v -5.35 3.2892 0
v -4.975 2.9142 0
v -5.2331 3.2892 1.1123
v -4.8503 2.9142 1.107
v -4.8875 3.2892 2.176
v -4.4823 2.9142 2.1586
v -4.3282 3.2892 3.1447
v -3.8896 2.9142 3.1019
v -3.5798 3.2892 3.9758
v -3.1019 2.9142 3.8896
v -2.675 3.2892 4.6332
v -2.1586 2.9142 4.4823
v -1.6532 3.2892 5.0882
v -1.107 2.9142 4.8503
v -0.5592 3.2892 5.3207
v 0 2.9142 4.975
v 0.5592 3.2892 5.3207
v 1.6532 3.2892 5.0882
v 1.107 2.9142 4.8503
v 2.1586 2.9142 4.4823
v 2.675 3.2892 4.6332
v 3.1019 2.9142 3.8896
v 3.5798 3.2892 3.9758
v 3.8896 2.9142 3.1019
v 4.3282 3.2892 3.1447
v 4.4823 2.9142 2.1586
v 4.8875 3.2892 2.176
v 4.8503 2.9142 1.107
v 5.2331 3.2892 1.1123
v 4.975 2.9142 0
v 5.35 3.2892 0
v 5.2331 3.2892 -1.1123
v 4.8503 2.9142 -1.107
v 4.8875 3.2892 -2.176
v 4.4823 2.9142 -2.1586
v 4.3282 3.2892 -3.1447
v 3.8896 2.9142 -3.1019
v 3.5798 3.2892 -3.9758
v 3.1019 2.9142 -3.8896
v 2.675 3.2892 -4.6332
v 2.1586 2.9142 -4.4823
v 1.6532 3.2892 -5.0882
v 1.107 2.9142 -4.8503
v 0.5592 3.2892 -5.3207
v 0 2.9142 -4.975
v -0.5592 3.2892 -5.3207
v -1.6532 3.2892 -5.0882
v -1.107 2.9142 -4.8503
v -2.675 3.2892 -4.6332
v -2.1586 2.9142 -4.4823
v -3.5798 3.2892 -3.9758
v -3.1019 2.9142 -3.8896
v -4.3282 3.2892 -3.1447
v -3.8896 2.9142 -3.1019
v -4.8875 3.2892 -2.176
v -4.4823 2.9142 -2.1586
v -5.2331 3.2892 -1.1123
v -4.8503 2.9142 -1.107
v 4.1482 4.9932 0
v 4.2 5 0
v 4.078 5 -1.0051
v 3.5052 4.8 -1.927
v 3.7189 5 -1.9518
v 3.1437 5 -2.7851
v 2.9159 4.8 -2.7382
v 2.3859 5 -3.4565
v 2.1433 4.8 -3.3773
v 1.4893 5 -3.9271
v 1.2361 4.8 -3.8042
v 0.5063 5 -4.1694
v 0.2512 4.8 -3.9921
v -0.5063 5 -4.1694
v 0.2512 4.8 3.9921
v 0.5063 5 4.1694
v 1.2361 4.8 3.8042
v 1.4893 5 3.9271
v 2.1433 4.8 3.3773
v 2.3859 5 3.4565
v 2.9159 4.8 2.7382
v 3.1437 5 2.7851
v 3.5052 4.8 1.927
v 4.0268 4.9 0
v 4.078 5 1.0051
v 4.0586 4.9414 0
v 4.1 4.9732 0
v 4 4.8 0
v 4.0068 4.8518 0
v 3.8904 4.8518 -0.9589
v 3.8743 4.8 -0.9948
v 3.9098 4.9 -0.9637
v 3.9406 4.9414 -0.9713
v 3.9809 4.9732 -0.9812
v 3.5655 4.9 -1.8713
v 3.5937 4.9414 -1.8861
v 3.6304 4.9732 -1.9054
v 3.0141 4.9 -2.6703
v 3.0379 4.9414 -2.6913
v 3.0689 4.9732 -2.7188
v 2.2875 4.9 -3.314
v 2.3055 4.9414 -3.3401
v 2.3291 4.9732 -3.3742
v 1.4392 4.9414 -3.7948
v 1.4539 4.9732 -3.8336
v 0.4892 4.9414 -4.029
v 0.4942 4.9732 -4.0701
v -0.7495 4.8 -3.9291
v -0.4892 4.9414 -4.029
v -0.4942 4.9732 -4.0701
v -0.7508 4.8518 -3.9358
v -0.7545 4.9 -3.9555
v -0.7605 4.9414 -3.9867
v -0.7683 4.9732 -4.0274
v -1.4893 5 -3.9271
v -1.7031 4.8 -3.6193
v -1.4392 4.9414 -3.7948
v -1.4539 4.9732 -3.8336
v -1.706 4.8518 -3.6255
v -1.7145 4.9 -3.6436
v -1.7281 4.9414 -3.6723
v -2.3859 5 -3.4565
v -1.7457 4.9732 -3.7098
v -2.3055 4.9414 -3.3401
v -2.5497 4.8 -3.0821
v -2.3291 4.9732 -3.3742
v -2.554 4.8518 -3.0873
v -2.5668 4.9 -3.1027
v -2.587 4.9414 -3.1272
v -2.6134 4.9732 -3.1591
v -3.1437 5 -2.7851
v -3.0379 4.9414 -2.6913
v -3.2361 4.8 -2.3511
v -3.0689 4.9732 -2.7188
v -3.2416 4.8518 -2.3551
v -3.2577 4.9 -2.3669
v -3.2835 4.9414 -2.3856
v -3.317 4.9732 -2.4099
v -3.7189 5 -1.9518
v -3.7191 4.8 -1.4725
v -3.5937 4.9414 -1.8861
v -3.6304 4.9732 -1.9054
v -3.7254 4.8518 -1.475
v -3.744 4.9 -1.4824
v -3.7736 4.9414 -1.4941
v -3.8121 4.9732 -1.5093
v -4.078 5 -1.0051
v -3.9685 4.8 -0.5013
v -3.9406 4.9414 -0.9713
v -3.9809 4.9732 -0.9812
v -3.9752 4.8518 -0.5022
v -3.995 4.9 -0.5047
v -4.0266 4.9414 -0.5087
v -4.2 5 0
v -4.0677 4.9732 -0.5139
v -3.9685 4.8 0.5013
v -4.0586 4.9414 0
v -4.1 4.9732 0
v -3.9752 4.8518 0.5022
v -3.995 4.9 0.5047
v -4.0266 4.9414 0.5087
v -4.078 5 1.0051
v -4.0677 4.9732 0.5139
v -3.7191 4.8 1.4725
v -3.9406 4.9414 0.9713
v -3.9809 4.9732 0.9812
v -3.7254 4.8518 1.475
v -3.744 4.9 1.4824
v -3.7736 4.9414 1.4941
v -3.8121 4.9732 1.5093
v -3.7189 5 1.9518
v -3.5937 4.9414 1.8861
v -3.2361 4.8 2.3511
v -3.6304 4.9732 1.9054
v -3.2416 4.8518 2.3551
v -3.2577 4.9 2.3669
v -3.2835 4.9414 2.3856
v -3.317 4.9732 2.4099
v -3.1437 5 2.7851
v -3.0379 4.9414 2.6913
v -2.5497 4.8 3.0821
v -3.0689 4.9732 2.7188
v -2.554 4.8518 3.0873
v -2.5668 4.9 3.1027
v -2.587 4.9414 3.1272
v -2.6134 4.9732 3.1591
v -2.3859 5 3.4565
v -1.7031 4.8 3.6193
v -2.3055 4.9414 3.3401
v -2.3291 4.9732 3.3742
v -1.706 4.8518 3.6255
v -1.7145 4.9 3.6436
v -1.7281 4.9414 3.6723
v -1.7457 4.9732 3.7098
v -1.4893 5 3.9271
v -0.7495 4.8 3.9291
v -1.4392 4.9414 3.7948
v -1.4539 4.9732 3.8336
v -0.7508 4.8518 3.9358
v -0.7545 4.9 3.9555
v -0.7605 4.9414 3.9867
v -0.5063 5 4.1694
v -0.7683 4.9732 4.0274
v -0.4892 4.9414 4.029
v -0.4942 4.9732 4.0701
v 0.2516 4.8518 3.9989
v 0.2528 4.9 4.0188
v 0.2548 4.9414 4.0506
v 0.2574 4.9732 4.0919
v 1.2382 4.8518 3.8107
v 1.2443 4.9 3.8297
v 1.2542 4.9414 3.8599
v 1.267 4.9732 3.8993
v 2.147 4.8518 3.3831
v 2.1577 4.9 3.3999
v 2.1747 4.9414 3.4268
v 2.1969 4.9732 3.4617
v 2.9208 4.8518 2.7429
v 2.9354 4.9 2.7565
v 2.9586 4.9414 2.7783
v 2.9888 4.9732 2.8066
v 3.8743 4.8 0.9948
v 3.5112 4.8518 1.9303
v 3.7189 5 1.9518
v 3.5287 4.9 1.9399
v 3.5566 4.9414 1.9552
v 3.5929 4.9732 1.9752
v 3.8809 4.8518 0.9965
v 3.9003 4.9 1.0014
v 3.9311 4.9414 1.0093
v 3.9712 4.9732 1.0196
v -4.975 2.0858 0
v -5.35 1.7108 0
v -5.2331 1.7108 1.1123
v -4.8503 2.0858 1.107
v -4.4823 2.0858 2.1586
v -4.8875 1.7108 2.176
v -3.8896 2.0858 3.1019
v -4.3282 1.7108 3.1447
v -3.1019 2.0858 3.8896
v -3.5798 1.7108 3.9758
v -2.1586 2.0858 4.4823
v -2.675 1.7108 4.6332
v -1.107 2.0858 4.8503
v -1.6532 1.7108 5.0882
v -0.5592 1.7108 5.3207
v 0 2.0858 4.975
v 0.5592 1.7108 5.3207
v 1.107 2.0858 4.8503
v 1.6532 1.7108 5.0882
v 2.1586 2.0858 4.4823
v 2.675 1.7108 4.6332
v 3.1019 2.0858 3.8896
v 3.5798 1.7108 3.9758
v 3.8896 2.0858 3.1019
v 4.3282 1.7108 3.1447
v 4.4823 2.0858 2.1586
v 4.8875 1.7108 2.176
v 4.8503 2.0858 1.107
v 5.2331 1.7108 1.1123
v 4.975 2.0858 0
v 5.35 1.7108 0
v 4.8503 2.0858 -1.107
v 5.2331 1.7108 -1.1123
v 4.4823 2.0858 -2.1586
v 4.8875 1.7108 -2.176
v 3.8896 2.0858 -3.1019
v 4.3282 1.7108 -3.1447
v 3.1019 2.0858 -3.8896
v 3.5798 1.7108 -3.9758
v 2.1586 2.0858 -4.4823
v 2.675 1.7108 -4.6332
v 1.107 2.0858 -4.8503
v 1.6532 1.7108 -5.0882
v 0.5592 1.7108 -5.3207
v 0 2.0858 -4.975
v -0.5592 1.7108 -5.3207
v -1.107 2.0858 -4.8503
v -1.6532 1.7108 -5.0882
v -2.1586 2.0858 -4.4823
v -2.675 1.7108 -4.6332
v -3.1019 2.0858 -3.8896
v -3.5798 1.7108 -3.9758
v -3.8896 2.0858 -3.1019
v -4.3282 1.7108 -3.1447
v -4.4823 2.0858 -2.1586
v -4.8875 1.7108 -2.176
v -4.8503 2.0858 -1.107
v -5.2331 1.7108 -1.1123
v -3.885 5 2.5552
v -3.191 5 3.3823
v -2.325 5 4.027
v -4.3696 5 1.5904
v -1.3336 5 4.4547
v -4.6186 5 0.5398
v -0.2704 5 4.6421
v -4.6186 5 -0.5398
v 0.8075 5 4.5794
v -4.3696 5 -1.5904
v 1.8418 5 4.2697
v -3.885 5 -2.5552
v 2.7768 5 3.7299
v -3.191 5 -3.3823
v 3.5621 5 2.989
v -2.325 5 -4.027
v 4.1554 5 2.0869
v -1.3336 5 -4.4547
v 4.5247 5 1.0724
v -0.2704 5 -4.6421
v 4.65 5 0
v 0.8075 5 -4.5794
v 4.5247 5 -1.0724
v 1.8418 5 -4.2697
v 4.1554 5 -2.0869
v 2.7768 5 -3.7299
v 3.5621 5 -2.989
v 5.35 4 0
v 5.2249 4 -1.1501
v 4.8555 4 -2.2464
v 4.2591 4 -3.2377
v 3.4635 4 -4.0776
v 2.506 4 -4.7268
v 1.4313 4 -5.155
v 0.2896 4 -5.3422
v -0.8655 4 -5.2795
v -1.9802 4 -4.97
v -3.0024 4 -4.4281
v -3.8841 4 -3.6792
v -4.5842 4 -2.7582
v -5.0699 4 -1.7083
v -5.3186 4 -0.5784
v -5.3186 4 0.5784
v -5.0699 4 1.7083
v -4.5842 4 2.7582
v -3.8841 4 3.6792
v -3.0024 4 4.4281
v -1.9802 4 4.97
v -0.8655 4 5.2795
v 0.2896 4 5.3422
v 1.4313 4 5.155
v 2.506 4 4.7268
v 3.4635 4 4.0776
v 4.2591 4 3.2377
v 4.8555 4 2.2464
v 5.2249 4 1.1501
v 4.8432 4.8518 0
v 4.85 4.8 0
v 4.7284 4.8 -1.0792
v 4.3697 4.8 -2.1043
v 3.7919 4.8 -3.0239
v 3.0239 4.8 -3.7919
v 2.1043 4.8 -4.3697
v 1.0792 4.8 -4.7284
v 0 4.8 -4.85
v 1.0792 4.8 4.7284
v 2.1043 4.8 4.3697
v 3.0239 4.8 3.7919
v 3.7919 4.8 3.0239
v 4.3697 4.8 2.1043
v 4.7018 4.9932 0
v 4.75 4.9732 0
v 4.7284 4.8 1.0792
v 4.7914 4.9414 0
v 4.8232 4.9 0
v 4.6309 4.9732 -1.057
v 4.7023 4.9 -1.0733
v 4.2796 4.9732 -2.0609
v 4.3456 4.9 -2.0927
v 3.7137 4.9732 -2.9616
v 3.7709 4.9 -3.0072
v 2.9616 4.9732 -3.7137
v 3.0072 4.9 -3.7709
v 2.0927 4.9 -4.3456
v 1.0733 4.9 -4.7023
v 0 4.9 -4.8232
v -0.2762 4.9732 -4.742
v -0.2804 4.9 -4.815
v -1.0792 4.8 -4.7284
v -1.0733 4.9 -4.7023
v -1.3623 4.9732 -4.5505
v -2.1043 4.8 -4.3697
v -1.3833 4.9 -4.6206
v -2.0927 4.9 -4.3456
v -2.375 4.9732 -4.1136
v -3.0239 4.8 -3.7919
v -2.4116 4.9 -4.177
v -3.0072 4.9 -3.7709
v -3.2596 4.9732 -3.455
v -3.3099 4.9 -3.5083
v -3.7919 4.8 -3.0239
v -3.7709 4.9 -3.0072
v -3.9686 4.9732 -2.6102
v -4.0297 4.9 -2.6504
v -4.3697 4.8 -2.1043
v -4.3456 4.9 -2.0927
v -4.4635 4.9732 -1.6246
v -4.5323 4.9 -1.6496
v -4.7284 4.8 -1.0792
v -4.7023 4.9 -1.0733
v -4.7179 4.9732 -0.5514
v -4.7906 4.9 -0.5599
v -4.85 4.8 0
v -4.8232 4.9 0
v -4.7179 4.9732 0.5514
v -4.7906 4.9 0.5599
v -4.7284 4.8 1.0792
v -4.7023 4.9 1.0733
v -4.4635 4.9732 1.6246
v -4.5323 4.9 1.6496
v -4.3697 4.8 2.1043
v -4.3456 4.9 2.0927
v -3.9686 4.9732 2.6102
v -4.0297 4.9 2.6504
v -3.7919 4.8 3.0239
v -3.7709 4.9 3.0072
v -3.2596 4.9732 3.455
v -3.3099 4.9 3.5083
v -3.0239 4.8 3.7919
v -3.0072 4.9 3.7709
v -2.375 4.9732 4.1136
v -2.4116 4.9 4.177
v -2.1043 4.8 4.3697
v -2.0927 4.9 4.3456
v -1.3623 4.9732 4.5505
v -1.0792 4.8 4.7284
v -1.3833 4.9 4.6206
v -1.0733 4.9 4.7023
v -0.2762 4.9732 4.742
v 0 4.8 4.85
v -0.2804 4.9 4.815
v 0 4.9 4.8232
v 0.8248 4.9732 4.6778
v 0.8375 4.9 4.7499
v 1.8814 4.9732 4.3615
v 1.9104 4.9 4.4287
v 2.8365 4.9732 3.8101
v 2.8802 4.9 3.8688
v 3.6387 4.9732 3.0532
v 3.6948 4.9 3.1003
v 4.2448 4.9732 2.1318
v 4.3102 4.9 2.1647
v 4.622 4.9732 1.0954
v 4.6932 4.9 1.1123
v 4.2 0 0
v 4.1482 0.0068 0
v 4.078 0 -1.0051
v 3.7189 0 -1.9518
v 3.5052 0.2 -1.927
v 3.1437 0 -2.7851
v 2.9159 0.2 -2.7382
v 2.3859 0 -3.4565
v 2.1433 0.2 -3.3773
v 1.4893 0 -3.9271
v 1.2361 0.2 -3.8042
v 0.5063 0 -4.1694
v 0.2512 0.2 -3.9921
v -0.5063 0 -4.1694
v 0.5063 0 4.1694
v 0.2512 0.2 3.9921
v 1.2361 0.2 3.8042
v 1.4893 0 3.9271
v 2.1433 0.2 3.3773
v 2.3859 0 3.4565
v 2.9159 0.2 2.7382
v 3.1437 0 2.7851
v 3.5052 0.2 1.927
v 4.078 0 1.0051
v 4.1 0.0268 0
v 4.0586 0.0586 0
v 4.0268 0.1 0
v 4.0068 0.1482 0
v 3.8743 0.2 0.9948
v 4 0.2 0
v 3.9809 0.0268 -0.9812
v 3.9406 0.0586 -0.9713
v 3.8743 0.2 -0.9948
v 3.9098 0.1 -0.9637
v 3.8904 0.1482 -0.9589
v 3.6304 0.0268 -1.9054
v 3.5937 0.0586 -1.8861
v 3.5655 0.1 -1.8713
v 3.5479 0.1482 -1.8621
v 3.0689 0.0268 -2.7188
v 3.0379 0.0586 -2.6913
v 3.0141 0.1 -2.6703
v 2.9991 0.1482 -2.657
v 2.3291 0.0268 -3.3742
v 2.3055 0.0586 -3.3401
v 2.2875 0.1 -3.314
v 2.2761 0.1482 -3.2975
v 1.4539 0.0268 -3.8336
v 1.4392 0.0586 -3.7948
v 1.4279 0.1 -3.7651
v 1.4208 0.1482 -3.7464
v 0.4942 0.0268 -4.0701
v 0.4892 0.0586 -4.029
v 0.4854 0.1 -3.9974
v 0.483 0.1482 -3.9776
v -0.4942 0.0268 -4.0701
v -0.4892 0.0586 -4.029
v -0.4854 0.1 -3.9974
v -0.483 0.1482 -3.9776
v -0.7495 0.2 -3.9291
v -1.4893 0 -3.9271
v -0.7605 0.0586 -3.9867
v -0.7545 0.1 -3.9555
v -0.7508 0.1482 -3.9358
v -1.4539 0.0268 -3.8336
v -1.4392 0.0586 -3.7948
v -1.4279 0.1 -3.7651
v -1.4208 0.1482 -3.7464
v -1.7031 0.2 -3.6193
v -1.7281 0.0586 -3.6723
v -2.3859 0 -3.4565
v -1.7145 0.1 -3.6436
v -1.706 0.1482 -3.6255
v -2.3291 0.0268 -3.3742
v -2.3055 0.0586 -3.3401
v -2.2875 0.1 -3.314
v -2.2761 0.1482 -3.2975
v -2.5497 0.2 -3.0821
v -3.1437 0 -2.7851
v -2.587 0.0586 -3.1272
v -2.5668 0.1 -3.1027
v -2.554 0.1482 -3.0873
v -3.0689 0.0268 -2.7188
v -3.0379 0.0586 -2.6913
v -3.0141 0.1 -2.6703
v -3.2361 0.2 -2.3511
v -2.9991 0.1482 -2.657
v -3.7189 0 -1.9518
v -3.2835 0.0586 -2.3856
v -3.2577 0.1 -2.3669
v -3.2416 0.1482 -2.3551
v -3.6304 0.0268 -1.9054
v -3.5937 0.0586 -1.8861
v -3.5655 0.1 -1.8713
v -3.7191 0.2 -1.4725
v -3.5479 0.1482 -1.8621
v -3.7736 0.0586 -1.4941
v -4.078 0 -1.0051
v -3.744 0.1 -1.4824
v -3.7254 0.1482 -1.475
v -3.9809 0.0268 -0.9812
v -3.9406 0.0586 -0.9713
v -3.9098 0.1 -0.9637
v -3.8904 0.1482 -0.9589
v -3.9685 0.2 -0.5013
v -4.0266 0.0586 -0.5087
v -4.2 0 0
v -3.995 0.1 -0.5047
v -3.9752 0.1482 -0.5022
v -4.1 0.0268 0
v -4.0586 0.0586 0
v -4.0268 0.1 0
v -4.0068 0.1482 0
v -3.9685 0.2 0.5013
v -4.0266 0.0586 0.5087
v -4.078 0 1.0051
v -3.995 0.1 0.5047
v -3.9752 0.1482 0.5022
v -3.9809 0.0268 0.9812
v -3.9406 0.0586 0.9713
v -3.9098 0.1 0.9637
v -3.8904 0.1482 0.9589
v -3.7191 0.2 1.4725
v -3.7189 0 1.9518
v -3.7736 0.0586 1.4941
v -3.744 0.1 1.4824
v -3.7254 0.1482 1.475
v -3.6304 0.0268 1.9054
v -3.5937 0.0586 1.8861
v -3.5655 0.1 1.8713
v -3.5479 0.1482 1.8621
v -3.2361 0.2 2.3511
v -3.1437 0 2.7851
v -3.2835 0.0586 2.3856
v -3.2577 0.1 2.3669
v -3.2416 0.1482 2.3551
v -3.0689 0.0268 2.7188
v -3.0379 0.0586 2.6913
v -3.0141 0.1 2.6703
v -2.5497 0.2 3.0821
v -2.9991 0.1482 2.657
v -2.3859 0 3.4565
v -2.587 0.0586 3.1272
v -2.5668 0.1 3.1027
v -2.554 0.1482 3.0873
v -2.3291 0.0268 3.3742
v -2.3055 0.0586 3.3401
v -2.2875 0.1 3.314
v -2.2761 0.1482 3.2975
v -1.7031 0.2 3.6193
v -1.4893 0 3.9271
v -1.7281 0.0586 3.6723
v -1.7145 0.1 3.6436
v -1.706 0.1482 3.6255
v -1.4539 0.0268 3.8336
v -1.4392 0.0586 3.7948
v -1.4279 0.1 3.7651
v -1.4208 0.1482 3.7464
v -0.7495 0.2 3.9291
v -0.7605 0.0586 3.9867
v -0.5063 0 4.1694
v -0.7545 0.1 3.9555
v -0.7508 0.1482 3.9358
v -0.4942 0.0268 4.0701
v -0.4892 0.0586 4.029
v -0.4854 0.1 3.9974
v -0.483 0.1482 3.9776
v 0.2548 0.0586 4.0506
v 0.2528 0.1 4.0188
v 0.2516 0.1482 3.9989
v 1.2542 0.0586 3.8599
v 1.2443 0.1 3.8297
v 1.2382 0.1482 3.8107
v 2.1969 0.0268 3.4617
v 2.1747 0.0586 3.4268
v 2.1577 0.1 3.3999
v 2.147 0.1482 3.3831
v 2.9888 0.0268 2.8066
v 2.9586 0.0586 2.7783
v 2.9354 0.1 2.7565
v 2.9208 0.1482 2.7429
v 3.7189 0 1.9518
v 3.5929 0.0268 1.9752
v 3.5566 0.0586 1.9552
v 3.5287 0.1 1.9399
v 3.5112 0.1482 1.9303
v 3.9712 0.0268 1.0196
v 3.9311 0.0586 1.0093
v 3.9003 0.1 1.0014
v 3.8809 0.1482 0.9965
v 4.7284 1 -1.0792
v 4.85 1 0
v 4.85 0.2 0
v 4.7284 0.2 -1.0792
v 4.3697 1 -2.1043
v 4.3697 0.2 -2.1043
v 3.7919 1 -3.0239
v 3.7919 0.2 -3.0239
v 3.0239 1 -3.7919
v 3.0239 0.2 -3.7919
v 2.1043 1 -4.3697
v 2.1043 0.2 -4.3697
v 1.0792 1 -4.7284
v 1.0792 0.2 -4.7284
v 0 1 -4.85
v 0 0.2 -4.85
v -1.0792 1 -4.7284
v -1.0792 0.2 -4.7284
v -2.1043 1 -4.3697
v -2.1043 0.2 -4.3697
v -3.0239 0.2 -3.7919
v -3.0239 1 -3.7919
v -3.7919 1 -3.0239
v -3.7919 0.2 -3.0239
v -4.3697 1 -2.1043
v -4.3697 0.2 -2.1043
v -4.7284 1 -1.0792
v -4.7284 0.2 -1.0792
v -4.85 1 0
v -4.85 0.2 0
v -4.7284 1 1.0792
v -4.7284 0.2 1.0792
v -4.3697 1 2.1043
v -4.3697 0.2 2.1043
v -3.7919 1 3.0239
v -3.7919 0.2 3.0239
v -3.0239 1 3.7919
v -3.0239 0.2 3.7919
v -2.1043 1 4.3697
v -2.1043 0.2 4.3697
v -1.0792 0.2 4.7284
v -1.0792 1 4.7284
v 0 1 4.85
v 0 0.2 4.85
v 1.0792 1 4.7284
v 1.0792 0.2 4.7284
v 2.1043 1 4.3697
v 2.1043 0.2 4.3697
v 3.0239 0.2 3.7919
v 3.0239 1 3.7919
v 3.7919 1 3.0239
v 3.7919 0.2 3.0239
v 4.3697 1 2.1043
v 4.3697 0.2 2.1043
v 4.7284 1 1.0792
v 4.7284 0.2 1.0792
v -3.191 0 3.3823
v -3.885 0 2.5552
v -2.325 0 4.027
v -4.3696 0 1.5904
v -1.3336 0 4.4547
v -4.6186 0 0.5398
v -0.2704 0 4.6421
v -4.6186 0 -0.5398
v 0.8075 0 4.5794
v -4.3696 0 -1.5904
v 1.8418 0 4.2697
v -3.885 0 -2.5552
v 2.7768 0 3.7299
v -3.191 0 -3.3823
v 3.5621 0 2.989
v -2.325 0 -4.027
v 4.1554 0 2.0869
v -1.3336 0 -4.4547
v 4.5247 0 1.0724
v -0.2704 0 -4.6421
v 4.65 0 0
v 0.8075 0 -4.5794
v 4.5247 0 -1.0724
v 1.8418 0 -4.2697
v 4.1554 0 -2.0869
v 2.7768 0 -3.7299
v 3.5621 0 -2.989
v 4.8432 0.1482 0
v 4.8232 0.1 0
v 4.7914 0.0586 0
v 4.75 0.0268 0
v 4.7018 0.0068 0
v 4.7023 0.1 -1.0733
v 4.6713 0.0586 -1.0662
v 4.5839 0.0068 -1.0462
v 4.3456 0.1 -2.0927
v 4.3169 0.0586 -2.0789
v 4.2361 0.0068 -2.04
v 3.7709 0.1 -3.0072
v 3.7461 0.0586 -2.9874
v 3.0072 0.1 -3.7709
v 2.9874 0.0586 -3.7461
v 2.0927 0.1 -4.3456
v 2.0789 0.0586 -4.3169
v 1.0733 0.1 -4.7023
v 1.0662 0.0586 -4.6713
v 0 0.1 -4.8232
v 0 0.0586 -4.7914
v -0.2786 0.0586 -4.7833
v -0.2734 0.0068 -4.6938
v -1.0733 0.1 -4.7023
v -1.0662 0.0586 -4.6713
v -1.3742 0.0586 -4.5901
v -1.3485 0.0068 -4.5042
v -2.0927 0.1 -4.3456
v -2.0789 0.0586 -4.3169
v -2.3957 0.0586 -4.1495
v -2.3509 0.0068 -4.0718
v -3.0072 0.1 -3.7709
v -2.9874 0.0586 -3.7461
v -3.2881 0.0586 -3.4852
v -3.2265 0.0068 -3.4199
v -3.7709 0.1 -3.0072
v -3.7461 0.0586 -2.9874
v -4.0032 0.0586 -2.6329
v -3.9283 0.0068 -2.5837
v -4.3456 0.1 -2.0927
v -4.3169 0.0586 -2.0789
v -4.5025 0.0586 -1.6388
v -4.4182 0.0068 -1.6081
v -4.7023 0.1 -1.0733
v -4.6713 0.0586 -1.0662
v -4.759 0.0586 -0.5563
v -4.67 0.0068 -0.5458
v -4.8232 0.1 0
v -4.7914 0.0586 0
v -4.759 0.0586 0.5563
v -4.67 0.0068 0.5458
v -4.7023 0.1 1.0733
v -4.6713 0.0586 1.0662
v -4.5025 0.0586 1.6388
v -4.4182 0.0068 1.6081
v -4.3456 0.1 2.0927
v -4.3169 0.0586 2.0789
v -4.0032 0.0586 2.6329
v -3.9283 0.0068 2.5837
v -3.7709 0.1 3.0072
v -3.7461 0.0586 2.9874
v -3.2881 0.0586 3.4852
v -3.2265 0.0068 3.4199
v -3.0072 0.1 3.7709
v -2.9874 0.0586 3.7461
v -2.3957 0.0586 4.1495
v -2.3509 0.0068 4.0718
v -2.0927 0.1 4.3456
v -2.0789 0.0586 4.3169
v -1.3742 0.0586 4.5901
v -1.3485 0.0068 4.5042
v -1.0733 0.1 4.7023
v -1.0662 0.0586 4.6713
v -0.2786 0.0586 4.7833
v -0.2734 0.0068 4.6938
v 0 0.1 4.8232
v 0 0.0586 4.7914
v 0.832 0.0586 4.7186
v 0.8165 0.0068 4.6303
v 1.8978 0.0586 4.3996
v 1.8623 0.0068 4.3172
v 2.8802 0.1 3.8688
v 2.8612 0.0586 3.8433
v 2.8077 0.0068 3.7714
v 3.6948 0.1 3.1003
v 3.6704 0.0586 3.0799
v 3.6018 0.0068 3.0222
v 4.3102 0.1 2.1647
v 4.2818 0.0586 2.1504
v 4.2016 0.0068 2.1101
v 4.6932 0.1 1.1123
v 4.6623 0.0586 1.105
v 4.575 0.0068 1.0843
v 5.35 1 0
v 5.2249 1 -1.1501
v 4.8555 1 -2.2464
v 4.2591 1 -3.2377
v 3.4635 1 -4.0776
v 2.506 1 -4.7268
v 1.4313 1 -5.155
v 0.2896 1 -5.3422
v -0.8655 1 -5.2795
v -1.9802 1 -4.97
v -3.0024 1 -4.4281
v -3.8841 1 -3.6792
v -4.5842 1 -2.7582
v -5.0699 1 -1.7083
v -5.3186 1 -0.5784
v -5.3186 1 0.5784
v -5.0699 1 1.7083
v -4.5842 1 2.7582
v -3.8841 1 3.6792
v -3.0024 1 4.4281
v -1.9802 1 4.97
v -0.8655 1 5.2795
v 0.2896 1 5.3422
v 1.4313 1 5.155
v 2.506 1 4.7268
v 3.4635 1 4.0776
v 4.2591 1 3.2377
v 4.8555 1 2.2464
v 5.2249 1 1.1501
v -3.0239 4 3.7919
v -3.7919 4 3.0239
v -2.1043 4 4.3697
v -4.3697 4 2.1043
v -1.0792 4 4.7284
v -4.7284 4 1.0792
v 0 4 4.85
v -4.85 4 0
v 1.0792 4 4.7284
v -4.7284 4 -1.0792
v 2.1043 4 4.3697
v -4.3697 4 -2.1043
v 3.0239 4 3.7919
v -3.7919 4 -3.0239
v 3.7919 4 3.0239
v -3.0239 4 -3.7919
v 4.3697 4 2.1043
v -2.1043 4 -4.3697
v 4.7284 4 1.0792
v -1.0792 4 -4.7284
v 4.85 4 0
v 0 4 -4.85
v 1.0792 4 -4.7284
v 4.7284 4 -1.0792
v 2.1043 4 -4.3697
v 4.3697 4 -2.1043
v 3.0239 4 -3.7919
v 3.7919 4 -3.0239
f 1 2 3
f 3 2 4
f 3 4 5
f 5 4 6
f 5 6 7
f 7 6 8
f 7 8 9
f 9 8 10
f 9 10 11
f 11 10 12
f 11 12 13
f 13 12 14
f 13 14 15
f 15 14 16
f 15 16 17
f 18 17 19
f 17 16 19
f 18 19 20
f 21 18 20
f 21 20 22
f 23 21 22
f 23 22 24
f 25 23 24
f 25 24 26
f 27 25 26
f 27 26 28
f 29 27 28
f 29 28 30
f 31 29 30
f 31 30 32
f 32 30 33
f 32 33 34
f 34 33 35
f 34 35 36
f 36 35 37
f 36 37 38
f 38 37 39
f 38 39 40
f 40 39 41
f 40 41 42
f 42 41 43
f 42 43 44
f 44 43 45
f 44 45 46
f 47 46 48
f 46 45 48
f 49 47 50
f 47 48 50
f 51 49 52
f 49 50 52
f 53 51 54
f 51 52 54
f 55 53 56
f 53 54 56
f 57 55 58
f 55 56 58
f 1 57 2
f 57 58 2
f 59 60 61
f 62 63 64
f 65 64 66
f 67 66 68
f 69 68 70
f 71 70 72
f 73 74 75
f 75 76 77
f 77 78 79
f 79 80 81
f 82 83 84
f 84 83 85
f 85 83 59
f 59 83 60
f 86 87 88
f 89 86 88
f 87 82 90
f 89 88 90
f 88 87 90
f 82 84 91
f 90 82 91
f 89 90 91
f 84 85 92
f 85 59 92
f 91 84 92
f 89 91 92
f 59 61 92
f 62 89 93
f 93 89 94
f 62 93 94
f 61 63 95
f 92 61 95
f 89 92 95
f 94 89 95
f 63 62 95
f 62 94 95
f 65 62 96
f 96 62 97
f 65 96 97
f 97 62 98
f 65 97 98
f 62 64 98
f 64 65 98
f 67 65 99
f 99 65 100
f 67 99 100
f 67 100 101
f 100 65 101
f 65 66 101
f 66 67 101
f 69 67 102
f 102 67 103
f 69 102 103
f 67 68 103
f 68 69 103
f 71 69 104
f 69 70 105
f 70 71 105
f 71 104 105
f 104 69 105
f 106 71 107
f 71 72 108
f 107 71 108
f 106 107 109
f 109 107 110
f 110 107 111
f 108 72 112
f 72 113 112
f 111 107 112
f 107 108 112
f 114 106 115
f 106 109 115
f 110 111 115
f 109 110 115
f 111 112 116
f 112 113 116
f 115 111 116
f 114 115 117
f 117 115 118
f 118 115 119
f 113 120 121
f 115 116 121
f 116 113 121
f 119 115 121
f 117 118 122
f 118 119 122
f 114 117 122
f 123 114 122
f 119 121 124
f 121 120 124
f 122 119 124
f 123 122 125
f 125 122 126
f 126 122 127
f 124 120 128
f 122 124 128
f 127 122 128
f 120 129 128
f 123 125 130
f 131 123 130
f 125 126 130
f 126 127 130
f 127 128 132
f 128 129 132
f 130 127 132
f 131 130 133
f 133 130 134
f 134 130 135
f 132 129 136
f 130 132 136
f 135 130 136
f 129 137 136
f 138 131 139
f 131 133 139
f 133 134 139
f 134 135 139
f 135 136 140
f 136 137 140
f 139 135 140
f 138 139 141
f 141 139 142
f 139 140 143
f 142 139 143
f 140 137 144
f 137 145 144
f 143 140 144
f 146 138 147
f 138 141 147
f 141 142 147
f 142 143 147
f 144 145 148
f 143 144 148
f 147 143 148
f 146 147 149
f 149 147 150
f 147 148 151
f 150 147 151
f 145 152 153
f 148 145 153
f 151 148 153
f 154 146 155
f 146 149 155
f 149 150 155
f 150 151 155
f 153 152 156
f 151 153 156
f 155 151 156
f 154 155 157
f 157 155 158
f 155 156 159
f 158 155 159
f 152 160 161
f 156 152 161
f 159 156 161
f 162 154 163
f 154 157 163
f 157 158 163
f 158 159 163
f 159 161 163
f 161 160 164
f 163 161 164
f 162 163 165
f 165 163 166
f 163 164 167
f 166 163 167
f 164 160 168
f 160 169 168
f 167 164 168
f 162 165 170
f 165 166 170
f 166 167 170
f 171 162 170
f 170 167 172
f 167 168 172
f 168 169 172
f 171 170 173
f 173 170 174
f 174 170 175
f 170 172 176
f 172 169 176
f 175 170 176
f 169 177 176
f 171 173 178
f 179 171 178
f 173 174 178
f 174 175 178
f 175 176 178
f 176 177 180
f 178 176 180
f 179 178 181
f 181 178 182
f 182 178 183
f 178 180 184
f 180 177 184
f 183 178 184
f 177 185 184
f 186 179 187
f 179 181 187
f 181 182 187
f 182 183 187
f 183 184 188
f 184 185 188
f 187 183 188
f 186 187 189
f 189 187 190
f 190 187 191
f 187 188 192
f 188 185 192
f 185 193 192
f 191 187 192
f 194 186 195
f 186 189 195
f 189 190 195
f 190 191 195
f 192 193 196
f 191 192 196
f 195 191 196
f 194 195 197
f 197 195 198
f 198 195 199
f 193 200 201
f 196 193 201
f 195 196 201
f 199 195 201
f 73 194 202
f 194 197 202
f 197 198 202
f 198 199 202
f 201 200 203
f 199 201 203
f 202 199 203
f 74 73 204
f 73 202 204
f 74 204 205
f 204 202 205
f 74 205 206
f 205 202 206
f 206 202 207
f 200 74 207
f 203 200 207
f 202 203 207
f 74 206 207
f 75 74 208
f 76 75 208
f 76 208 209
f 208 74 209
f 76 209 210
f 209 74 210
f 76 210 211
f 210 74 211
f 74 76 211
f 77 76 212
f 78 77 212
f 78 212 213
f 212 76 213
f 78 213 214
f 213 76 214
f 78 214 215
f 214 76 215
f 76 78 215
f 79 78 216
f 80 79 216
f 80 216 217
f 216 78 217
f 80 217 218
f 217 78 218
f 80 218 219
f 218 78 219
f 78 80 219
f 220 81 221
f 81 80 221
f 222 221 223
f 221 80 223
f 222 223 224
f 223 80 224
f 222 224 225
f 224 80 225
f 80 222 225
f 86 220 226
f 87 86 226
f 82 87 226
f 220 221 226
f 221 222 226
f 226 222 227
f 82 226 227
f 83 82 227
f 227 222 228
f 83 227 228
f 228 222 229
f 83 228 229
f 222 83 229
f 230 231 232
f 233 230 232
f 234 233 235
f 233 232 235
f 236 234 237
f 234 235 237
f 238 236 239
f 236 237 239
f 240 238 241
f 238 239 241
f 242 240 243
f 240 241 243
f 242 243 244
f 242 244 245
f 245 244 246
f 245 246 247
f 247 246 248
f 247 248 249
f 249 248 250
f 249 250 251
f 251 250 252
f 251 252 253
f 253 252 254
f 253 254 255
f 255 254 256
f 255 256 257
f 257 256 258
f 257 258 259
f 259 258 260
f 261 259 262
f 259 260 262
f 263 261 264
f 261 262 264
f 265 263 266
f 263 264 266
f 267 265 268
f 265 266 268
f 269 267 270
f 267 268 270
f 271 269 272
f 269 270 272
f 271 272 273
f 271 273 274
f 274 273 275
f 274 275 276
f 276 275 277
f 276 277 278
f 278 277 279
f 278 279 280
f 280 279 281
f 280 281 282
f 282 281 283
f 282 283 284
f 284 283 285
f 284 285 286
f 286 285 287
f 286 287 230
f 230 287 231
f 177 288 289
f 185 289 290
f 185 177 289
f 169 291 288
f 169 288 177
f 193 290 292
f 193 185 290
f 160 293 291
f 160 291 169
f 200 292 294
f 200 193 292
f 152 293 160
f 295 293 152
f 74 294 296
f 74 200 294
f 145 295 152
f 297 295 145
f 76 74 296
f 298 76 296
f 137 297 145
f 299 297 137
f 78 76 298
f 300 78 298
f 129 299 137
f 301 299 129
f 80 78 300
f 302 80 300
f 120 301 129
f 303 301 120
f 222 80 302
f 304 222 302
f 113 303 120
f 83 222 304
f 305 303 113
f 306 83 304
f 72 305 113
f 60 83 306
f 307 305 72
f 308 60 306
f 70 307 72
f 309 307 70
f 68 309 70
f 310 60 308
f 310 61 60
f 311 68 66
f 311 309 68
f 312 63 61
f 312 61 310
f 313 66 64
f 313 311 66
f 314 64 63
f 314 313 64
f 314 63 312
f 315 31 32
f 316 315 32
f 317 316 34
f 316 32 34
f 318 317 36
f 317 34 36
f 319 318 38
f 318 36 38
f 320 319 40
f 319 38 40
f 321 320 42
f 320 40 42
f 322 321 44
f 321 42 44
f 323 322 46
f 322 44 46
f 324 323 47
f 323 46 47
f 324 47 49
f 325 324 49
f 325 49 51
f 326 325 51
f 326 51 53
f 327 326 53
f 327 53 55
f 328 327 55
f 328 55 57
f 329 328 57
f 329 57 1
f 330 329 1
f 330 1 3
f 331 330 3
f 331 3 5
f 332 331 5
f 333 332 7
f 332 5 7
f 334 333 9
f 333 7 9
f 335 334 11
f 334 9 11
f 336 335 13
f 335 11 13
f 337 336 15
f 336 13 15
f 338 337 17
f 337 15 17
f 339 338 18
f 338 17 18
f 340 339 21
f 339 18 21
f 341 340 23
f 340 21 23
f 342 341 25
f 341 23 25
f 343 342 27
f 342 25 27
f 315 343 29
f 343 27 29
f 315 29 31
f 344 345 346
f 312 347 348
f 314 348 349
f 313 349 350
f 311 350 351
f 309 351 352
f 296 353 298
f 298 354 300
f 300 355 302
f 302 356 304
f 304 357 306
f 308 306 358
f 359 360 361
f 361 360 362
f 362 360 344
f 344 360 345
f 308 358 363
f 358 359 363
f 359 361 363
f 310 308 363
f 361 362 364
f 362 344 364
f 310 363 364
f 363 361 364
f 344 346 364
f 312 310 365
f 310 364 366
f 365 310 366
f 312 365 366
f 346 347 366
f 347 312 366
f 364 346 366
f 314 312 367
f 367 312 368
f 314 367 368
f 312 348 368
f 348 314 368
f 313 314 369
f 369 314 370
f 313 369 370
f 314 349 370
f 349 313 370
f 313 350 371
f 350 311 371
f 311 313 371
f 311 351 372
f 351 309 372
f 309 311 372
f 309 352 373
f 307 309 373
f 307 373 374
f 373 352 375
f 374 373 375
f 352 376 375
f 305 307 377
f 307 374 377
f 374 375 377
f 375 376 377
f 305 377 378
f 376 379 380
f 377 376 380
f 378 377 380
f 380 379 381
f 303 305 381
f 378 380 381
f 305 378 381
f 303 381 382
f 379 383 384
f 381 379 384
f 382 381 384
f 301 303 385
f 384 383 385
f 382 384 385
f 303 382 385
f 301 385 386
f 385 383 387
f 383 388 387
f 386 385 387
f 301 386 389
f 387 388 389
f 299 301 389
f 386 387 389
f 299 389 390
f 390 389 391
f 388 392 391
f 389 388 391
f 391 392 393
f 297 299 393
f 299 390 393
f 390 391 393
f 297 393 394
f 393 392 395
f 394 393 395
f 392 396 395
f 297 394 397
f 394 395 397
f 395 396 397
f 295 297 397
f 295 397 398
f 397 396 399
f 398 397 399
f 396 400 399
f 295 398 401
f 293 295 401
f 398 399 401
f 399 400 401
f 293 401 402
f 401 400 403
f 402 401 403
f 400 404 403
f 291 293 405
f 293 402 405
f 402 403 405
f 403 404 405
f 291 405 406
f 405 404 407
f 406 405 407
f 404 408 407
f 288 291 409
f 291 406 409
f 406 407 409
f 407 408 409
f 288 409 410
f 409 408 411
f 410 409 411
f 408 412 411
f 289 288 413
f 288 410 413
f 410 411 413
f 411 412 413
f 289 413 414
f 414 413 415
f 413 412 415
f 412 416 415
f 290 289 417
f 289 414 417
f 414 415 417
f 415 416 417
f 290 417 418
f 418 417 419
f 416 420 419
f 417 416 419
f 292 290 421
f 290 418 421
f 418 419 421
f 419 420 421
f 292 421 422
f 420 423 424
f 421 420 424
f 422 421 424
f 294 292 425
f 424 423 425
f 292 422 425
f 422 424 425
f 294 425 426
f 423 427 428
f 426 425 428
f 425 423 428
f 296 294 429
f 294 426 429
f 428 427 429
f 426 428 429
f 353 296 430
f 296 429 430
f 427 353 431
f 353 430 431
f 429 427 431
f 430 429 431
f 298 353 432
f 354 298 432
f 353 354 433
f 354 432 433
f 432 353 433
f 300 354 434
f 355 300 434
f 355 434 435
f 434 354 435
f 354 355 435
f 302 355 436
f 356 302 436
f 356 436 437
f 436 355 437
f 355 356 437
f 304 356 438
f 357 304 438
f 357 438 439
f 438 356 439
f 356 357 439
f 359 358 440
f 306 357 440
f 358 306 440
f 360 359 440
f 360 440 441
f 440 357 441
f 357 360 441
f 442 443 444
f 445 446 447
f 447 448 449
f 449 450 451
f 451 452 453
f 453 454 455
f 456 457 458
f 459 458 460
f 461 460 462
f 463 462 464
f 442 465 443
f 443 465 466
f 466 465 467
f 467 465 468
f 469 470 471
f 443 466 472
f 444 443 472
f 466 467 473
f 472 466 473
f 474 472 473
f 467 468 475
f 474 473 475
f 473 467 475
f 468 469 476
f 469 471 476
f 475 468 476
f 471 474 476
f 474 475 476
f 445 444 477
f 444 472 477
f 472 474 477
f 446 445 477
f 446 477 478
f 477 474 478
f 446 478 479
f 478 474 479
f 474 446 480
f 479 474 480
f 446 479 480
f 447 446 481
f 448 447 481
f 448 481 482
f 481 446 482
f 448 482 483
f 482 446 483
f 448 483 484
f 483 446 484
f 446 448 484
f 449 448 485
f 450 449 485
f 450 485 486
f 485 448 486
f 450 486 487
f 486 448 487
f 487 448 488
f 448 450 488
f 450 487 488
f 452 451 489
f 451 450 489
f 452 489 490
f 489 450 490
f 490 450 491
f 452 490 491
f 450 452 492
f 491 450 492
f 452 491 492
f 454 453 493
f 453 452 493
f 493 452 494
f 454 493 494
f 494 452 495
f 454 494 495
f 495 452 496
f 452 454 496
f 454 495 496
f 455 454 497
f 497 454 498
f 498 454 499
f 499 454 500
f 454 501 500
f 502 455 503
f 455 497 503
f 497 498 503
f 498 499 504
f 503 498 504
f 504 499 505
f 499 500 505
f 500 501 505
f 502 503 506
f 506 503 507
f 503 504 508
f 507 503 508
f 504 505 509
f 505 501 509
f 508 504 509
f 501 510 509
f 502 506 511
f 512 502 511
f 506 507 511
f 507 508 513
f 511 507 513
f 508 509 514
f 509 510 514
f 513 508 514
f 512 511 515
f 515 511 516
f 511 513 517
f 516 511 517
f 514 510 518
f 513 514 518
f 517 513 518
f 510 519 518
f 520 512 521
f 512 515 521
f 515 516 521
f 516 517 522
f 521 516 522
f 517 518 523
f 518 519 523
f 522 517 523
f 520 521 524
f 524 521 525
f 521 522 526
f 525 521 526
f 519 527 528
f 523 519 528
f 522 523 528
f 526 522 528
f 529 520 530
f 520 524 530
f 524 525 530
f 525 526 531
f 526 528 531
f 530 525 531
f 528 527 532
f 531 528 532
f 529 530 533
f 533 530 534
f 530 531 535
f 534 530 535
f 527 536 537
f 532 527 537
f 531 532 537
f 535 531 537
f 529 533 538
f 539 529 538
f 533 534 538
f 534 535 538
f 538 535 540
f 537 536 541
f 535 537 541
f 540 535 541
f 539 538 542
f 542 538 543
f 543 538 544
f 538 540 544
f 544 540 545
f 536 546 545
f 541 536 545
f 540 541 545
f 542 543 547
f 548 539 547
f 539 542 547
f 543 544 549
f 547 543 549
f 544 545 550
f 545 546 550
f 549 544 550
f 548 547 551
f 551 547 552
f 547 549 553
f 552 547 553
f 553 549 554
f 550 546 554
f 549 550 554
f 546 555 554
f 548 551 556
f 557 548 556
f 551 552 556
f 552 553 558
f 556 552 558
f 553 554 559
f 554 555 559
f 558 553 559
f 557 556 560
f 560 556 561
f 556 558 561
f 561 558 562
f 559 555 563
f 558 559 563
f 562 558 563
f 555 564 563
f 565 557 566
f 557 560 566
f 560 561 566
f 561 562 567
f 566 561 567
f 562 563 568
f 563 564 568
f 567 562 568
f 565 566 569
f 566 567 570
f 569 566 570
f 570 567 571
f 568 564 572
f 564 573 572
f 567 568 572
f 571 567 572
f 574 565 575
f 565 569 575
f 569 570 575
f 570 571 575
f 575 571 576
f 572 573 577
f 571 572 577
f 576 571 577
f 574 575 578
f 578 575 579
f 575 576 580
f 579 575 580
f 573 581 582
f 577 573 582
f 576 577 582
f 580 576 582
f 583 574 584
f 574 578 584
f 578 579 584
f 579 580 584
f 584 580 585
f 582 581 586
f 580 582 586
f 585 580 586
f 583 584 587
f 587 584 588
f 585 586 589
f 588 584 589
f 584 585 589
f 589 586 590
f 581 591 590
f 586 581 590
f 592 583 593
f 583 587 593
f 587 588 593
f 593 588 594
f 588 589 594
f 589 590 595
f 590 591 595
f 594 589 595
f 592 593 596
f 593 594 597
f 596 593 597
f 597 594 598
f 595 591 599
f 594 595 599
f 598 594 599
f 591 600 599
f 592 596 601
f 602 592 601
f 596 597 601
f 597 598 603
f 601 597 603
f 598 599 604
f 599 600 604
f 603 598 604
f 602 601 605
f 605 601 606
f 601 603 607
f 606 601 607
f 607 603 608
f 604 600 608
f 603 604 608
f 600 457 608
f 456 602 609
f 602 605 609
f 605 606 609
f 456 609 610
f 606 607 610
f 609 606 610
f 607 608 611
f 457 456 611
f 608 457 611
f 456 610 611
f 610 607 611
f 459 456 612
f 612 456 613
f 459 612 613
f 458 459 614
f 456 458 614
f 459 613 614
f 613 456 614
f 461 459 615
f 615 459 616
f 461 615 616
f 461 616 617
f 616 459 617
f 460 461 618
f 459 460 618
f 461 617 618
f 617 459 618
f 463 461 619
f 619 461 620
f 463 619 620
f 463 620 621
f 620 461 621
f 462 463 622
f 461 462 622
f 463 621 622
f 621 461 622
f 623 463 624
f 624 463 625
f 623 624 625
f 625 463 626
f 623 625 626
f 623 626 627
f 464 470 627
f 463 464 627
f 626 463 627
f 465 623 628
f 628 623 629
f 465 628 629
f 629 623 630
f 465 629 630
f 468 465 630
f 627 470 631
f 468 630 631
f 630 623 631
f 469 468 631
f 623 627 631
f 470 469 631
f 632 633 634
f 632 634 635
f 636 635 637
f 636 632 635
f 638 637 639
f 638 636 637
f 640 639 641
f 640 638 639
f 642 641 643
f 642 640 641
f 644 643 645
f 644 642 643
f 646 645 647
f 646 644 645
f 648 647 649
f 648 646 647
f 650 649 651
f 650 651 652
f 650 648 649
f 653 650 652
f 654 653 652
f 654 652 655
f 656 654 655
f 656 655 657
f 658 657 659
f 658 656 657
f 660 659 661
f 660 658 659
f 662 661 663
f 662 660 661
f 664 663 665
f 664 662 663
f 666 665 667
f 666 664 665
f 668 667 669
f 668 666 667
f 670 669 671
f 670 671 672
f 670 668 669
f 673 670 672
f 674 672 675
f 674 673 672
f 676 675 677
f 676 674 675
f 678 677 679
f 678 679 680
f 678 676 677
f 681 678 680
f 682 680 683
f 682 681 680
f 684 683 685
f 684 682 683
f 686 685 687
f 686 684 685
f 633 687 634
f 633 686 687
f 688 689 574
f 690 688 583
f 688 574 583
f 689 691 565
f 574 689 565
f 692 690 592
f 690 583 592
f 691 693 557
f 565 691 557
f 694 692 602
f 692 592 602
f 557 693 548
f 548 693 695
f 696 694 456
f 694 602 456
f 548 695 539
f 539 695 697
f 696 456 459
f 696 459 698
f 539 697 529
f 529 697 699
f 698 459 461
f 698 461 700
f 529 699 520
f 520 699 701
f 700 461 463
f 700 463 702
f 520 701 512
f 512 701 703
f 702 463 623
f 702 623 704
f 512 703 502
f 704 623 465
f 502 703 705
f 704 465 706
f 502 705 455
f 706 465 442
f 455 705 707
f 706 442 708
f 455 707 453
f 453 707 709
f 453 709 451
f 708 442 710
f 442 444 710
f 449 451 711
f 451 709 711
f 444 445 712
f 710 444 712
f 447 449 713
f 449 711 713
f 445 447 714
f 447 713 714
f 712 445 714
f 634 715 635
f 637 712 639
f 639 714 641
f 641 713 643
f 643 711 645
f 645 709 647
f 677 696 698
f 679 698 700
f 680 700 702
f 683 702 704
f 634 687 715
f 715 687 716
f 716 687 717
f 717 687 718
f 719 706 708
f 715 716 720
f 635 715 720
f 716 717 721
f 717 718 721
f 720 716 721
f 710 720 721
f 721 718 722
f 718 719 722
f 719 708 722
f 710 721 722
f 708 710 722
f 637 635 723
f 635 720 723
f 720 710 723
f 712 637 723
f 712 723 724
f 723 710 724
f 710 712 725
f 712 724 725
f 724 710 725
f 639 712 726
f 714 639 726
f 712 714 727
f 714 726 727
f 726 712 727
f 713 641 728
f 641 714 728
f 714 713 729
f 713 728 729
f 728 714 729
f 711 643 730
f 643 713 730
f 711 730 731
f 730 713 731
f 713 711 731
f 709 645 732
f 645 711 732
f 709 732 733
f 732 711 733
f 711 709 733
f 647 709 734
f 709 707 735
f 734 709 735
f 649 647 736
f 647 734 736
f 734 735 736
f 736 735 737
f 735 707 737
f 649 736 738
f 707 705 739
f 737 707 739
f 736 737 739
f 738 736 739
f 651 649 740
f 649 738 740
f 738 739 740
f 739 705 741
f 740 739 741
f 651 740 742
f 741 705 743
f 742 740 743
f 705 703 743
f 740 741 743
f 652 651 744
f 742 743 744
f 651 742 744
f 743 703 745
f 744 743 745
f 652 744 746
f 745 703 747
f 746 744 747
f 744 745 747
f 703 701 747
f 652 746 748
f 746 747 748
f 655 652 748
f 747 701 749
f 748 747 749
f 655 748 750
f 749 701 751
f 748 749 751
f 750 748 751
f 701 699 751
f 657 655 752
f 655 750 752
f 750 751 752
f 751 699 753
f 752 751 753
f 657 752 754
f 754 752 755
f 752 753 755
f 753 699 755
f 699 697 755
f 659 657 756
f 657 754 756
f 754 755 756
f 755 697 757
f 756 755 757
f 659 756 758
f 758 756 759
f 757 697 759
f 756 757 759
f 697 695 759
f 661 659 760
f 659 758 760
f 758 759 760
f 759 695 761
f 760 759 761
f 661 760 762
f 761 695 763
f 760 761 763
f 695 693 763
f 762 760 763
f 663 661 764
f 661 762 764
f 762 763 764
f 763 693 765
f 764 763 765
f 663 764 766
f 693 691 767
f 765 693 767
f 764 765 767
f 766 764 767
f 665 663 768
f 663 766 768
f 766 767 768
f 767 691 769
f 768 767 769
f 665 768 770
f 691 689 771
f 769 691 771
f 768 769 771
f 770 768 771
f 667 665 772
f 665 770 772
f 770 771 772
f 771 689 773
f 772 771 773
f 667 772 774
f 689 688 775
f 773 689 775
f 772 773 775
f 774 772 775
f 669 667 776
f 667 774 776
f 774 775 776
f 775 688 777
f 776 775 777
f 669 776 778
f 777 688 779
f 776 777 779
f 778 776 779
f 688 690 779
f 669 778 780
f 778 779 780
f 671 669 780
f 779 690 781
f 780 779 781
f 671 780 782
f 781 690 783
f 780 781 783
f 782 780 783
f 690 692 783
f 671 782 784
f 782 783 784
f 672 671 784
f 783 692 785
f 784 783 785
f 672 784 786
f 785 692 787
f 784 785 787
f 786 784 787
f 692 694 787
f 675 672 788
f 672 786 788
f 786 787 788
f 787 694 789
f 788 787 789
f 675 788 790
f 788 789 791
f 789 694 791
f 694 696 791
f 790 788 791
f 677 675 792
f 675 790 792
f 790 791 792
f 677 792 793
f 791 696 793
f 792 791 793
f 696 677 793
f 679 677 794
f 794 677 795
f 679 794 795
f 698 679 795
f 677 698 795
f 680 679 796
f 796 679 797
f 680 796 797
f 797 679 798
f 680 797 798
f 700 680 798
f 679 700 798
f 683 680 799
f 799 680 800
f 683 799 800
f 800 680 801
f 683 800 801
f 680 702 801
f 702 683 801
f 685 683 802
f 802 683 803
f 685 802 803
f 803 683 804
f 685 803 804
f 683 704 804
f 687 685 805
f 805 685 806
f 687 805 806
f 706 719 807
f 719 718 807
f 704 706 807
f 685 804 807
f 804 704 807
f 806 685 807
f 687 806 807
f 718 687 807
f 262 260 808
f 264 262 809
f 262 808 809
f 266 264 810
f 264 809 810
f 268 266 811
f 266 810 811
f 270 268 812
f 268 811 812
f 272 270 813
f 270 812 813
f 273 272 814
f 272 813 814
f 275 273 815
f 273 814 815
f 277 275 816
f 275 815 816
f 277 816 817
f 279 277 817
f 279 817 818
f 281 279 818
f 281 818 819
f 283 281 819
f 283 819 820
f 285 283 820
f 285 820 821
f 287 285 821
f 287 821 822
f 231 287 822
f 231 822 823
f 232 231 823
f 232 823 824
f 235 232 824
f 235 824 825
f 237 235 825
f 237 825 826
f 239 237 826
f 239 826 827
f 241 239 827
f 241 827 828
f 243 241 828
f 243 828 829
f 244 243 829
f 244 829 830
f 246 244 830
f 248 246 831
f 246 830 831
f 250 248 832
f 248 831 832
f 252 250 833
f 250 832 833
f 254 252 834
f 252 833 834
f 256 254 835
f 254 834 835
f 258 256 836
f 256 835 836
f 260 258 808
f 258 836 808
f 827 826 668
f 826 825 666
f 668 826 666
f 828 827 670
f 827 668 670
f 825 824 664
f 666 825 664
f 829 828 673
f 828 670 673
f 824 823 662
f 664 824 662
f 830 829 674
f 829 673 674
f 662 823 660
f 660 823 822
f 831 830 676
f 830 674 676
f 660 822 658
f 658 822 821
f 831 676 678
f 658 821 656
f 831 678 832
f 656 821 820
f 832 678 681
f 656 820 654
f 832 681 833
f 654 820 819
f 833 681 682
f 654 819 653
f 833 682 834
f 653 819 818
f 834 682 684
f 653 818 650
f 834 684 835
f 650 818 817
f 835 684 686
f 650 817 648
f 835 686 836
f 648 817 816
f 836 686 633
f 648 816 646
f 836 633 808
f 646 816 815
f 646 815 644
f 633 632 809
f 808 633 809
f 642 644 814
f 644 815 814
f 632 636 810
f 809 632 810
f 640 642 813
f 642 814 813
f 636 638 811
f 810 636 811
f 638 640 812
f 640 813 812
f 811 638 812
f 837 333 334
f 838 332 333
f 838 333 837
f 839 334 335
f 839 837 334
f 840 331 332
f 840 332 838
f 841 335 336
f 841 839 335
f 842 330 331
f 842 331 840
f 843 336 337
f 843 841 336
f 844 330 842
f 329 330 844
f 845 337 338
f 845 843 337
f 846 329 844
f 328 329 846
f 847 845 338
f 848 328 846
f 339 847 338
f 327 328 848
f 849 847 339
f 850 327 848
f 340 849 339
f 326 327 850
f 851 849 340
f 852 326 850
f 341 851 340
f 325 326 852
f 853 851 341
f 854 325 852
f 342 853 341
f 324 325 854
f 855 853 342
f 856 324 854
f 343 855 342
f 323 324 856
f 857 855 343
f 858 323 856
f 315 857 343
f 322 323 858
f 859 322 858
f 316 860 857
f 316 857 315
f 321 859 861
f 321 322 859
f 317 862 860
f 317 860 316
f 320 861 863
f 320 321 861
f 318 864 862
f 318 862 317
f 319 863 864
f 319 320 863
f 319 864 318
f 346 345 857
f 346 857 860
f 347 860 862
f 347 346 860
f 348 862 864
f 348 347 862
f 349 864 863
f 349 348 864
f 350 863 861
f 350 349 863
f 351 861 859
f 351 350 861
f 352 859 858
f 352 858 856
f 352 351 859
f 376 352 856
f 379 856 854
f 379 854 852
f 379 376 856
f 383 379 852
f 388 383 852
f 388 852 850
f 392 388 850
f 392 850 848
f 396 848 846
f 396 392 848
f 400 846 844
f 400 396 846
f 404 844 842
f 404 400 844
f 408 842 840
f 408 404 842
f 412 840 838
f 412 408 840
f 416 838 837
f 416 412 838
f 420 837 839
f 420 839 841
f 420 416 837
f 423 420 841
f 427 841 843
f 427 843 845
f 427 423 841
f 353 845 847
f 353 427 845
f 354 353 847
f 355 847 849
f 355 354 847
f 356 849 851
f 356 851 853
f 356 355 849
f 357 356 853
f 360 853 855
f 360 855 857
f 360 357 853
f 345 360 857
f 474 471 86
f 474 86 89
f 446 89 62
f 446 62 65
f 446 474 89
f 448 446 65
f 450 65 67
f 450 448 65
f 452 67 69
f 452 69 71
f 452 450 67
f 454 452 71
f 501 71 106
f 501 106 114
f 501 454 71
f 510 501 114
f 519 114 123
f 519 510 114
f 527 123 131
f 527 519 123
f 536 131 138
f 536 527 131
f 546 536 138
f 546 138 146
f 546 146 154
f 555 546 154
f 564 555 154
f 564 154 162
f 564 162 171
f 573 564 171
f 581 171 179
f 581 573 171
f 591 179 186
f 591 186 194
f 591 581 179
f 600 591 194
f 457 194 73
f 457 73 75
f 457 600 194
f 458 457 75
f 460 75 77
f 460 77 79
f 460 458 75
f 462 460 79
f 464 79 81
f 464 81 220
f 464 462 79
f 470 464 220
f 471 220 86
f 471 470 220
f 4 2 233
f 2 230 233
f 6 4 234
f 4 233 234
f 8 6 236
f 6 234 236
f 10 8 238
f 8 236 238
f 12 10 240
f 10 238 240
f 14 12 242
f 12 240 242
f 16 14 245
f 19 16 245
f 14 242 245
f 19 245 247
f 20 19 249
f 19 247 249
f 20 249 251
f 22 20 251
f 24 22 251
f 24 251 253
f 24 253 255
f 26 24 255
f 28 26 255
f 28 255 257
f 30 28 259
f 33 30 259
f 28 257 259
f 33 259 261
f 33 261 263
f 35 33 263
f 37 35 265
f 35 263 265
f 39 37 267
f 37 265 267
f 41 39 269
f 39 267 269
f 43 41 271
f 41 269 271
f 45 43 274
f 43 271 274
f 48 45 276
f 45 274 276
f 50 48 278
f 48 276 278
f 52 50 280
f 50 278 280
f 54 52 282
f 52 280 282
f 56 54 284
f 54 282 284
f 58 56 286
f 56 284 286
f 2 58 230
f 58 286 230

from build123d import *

# Parameters (mm, degrees)
IZIM1_R                     = 5.35
IZIM1_R_2                   = 4
Y_KSEKLIK_EKSTR_ZYON1_DEPTH = 5
IZIM4_R                     = 5.35
IZIM4_R_2                   = 4.85
KES_EKSTR_ZYON1_DEPTH       = 1
L_O_ALTMA1_COUNT            = 2
L_O_ALTMA1_PITCH            = 4
RADYUS1_R                   = 0.2


with BuildPart() as part:
    # Çizim1 → Yükseklik-Ekstrüzyon1 (new body)
    with BuildSketch(Plane(origin=(0, 0, 0), x_dir=(1, 0, 0), z_dir=(0, 1, 0))):
        Circle(IZIM1_R)
        Circle(IZIM1_R_2, mode=Mode.SUBTRACT)
    extrude(amount=Y_KSEKLIK_EKSTR_ZYON1_DEPTH)

    # Çizim4 → Kes-Ekstrüzyon1 (cut)
    with BuildSketch(Plane(origin=(0, 5, 0), x_dir=(1, 0, 0), z_dir=(0, 1, 0))):
        Circle(IZIM4_R)
        Circle(IZIM4_R_2, mode=Mode.SUBTRACT)
    kes_ekstr_zyon1 = extrude(amount=-KES_EKSTR_ZYON1_DEPTH, mode=Mode.SUBTRACT)

    # LÇoğaltma1: Kes-Ekstrüzyon1 ×2
    with Locations(*[(0, -i * L_O_ALTMA1_PITCH, 0) for i in range(1, L_O_ALTMA1_COUNT)]):
        add(kes_ekstr_zyon1, mode=Mode.SUBTRACT)

    # Çizim6 → Kes-Döndür1 (revolve, cut)
    with BuildSketch(Plane.XY):
        Polygon((-5.560786438, 3.5), (-4.975, 2.914213562), (-4.975, 2.085786438), (-5.560786438, 1.5), align=None)
    revolve(axis=Axis((0, 0, 0), (0, 1, 0)), mode=Mode.SUBTRACT)

    # Radyus1
    radyus1_edges = [part.edges().sort_by_distance(p)[0] for p in [
        (-4.85, 5, 0),
        (-4.85, 0, 0),
        (-4, 0, 0),
        (-4, 5, 0),
    ]]
    fillet(radyus1_edges, radius=RADYUS1_R)


solid = part.part
